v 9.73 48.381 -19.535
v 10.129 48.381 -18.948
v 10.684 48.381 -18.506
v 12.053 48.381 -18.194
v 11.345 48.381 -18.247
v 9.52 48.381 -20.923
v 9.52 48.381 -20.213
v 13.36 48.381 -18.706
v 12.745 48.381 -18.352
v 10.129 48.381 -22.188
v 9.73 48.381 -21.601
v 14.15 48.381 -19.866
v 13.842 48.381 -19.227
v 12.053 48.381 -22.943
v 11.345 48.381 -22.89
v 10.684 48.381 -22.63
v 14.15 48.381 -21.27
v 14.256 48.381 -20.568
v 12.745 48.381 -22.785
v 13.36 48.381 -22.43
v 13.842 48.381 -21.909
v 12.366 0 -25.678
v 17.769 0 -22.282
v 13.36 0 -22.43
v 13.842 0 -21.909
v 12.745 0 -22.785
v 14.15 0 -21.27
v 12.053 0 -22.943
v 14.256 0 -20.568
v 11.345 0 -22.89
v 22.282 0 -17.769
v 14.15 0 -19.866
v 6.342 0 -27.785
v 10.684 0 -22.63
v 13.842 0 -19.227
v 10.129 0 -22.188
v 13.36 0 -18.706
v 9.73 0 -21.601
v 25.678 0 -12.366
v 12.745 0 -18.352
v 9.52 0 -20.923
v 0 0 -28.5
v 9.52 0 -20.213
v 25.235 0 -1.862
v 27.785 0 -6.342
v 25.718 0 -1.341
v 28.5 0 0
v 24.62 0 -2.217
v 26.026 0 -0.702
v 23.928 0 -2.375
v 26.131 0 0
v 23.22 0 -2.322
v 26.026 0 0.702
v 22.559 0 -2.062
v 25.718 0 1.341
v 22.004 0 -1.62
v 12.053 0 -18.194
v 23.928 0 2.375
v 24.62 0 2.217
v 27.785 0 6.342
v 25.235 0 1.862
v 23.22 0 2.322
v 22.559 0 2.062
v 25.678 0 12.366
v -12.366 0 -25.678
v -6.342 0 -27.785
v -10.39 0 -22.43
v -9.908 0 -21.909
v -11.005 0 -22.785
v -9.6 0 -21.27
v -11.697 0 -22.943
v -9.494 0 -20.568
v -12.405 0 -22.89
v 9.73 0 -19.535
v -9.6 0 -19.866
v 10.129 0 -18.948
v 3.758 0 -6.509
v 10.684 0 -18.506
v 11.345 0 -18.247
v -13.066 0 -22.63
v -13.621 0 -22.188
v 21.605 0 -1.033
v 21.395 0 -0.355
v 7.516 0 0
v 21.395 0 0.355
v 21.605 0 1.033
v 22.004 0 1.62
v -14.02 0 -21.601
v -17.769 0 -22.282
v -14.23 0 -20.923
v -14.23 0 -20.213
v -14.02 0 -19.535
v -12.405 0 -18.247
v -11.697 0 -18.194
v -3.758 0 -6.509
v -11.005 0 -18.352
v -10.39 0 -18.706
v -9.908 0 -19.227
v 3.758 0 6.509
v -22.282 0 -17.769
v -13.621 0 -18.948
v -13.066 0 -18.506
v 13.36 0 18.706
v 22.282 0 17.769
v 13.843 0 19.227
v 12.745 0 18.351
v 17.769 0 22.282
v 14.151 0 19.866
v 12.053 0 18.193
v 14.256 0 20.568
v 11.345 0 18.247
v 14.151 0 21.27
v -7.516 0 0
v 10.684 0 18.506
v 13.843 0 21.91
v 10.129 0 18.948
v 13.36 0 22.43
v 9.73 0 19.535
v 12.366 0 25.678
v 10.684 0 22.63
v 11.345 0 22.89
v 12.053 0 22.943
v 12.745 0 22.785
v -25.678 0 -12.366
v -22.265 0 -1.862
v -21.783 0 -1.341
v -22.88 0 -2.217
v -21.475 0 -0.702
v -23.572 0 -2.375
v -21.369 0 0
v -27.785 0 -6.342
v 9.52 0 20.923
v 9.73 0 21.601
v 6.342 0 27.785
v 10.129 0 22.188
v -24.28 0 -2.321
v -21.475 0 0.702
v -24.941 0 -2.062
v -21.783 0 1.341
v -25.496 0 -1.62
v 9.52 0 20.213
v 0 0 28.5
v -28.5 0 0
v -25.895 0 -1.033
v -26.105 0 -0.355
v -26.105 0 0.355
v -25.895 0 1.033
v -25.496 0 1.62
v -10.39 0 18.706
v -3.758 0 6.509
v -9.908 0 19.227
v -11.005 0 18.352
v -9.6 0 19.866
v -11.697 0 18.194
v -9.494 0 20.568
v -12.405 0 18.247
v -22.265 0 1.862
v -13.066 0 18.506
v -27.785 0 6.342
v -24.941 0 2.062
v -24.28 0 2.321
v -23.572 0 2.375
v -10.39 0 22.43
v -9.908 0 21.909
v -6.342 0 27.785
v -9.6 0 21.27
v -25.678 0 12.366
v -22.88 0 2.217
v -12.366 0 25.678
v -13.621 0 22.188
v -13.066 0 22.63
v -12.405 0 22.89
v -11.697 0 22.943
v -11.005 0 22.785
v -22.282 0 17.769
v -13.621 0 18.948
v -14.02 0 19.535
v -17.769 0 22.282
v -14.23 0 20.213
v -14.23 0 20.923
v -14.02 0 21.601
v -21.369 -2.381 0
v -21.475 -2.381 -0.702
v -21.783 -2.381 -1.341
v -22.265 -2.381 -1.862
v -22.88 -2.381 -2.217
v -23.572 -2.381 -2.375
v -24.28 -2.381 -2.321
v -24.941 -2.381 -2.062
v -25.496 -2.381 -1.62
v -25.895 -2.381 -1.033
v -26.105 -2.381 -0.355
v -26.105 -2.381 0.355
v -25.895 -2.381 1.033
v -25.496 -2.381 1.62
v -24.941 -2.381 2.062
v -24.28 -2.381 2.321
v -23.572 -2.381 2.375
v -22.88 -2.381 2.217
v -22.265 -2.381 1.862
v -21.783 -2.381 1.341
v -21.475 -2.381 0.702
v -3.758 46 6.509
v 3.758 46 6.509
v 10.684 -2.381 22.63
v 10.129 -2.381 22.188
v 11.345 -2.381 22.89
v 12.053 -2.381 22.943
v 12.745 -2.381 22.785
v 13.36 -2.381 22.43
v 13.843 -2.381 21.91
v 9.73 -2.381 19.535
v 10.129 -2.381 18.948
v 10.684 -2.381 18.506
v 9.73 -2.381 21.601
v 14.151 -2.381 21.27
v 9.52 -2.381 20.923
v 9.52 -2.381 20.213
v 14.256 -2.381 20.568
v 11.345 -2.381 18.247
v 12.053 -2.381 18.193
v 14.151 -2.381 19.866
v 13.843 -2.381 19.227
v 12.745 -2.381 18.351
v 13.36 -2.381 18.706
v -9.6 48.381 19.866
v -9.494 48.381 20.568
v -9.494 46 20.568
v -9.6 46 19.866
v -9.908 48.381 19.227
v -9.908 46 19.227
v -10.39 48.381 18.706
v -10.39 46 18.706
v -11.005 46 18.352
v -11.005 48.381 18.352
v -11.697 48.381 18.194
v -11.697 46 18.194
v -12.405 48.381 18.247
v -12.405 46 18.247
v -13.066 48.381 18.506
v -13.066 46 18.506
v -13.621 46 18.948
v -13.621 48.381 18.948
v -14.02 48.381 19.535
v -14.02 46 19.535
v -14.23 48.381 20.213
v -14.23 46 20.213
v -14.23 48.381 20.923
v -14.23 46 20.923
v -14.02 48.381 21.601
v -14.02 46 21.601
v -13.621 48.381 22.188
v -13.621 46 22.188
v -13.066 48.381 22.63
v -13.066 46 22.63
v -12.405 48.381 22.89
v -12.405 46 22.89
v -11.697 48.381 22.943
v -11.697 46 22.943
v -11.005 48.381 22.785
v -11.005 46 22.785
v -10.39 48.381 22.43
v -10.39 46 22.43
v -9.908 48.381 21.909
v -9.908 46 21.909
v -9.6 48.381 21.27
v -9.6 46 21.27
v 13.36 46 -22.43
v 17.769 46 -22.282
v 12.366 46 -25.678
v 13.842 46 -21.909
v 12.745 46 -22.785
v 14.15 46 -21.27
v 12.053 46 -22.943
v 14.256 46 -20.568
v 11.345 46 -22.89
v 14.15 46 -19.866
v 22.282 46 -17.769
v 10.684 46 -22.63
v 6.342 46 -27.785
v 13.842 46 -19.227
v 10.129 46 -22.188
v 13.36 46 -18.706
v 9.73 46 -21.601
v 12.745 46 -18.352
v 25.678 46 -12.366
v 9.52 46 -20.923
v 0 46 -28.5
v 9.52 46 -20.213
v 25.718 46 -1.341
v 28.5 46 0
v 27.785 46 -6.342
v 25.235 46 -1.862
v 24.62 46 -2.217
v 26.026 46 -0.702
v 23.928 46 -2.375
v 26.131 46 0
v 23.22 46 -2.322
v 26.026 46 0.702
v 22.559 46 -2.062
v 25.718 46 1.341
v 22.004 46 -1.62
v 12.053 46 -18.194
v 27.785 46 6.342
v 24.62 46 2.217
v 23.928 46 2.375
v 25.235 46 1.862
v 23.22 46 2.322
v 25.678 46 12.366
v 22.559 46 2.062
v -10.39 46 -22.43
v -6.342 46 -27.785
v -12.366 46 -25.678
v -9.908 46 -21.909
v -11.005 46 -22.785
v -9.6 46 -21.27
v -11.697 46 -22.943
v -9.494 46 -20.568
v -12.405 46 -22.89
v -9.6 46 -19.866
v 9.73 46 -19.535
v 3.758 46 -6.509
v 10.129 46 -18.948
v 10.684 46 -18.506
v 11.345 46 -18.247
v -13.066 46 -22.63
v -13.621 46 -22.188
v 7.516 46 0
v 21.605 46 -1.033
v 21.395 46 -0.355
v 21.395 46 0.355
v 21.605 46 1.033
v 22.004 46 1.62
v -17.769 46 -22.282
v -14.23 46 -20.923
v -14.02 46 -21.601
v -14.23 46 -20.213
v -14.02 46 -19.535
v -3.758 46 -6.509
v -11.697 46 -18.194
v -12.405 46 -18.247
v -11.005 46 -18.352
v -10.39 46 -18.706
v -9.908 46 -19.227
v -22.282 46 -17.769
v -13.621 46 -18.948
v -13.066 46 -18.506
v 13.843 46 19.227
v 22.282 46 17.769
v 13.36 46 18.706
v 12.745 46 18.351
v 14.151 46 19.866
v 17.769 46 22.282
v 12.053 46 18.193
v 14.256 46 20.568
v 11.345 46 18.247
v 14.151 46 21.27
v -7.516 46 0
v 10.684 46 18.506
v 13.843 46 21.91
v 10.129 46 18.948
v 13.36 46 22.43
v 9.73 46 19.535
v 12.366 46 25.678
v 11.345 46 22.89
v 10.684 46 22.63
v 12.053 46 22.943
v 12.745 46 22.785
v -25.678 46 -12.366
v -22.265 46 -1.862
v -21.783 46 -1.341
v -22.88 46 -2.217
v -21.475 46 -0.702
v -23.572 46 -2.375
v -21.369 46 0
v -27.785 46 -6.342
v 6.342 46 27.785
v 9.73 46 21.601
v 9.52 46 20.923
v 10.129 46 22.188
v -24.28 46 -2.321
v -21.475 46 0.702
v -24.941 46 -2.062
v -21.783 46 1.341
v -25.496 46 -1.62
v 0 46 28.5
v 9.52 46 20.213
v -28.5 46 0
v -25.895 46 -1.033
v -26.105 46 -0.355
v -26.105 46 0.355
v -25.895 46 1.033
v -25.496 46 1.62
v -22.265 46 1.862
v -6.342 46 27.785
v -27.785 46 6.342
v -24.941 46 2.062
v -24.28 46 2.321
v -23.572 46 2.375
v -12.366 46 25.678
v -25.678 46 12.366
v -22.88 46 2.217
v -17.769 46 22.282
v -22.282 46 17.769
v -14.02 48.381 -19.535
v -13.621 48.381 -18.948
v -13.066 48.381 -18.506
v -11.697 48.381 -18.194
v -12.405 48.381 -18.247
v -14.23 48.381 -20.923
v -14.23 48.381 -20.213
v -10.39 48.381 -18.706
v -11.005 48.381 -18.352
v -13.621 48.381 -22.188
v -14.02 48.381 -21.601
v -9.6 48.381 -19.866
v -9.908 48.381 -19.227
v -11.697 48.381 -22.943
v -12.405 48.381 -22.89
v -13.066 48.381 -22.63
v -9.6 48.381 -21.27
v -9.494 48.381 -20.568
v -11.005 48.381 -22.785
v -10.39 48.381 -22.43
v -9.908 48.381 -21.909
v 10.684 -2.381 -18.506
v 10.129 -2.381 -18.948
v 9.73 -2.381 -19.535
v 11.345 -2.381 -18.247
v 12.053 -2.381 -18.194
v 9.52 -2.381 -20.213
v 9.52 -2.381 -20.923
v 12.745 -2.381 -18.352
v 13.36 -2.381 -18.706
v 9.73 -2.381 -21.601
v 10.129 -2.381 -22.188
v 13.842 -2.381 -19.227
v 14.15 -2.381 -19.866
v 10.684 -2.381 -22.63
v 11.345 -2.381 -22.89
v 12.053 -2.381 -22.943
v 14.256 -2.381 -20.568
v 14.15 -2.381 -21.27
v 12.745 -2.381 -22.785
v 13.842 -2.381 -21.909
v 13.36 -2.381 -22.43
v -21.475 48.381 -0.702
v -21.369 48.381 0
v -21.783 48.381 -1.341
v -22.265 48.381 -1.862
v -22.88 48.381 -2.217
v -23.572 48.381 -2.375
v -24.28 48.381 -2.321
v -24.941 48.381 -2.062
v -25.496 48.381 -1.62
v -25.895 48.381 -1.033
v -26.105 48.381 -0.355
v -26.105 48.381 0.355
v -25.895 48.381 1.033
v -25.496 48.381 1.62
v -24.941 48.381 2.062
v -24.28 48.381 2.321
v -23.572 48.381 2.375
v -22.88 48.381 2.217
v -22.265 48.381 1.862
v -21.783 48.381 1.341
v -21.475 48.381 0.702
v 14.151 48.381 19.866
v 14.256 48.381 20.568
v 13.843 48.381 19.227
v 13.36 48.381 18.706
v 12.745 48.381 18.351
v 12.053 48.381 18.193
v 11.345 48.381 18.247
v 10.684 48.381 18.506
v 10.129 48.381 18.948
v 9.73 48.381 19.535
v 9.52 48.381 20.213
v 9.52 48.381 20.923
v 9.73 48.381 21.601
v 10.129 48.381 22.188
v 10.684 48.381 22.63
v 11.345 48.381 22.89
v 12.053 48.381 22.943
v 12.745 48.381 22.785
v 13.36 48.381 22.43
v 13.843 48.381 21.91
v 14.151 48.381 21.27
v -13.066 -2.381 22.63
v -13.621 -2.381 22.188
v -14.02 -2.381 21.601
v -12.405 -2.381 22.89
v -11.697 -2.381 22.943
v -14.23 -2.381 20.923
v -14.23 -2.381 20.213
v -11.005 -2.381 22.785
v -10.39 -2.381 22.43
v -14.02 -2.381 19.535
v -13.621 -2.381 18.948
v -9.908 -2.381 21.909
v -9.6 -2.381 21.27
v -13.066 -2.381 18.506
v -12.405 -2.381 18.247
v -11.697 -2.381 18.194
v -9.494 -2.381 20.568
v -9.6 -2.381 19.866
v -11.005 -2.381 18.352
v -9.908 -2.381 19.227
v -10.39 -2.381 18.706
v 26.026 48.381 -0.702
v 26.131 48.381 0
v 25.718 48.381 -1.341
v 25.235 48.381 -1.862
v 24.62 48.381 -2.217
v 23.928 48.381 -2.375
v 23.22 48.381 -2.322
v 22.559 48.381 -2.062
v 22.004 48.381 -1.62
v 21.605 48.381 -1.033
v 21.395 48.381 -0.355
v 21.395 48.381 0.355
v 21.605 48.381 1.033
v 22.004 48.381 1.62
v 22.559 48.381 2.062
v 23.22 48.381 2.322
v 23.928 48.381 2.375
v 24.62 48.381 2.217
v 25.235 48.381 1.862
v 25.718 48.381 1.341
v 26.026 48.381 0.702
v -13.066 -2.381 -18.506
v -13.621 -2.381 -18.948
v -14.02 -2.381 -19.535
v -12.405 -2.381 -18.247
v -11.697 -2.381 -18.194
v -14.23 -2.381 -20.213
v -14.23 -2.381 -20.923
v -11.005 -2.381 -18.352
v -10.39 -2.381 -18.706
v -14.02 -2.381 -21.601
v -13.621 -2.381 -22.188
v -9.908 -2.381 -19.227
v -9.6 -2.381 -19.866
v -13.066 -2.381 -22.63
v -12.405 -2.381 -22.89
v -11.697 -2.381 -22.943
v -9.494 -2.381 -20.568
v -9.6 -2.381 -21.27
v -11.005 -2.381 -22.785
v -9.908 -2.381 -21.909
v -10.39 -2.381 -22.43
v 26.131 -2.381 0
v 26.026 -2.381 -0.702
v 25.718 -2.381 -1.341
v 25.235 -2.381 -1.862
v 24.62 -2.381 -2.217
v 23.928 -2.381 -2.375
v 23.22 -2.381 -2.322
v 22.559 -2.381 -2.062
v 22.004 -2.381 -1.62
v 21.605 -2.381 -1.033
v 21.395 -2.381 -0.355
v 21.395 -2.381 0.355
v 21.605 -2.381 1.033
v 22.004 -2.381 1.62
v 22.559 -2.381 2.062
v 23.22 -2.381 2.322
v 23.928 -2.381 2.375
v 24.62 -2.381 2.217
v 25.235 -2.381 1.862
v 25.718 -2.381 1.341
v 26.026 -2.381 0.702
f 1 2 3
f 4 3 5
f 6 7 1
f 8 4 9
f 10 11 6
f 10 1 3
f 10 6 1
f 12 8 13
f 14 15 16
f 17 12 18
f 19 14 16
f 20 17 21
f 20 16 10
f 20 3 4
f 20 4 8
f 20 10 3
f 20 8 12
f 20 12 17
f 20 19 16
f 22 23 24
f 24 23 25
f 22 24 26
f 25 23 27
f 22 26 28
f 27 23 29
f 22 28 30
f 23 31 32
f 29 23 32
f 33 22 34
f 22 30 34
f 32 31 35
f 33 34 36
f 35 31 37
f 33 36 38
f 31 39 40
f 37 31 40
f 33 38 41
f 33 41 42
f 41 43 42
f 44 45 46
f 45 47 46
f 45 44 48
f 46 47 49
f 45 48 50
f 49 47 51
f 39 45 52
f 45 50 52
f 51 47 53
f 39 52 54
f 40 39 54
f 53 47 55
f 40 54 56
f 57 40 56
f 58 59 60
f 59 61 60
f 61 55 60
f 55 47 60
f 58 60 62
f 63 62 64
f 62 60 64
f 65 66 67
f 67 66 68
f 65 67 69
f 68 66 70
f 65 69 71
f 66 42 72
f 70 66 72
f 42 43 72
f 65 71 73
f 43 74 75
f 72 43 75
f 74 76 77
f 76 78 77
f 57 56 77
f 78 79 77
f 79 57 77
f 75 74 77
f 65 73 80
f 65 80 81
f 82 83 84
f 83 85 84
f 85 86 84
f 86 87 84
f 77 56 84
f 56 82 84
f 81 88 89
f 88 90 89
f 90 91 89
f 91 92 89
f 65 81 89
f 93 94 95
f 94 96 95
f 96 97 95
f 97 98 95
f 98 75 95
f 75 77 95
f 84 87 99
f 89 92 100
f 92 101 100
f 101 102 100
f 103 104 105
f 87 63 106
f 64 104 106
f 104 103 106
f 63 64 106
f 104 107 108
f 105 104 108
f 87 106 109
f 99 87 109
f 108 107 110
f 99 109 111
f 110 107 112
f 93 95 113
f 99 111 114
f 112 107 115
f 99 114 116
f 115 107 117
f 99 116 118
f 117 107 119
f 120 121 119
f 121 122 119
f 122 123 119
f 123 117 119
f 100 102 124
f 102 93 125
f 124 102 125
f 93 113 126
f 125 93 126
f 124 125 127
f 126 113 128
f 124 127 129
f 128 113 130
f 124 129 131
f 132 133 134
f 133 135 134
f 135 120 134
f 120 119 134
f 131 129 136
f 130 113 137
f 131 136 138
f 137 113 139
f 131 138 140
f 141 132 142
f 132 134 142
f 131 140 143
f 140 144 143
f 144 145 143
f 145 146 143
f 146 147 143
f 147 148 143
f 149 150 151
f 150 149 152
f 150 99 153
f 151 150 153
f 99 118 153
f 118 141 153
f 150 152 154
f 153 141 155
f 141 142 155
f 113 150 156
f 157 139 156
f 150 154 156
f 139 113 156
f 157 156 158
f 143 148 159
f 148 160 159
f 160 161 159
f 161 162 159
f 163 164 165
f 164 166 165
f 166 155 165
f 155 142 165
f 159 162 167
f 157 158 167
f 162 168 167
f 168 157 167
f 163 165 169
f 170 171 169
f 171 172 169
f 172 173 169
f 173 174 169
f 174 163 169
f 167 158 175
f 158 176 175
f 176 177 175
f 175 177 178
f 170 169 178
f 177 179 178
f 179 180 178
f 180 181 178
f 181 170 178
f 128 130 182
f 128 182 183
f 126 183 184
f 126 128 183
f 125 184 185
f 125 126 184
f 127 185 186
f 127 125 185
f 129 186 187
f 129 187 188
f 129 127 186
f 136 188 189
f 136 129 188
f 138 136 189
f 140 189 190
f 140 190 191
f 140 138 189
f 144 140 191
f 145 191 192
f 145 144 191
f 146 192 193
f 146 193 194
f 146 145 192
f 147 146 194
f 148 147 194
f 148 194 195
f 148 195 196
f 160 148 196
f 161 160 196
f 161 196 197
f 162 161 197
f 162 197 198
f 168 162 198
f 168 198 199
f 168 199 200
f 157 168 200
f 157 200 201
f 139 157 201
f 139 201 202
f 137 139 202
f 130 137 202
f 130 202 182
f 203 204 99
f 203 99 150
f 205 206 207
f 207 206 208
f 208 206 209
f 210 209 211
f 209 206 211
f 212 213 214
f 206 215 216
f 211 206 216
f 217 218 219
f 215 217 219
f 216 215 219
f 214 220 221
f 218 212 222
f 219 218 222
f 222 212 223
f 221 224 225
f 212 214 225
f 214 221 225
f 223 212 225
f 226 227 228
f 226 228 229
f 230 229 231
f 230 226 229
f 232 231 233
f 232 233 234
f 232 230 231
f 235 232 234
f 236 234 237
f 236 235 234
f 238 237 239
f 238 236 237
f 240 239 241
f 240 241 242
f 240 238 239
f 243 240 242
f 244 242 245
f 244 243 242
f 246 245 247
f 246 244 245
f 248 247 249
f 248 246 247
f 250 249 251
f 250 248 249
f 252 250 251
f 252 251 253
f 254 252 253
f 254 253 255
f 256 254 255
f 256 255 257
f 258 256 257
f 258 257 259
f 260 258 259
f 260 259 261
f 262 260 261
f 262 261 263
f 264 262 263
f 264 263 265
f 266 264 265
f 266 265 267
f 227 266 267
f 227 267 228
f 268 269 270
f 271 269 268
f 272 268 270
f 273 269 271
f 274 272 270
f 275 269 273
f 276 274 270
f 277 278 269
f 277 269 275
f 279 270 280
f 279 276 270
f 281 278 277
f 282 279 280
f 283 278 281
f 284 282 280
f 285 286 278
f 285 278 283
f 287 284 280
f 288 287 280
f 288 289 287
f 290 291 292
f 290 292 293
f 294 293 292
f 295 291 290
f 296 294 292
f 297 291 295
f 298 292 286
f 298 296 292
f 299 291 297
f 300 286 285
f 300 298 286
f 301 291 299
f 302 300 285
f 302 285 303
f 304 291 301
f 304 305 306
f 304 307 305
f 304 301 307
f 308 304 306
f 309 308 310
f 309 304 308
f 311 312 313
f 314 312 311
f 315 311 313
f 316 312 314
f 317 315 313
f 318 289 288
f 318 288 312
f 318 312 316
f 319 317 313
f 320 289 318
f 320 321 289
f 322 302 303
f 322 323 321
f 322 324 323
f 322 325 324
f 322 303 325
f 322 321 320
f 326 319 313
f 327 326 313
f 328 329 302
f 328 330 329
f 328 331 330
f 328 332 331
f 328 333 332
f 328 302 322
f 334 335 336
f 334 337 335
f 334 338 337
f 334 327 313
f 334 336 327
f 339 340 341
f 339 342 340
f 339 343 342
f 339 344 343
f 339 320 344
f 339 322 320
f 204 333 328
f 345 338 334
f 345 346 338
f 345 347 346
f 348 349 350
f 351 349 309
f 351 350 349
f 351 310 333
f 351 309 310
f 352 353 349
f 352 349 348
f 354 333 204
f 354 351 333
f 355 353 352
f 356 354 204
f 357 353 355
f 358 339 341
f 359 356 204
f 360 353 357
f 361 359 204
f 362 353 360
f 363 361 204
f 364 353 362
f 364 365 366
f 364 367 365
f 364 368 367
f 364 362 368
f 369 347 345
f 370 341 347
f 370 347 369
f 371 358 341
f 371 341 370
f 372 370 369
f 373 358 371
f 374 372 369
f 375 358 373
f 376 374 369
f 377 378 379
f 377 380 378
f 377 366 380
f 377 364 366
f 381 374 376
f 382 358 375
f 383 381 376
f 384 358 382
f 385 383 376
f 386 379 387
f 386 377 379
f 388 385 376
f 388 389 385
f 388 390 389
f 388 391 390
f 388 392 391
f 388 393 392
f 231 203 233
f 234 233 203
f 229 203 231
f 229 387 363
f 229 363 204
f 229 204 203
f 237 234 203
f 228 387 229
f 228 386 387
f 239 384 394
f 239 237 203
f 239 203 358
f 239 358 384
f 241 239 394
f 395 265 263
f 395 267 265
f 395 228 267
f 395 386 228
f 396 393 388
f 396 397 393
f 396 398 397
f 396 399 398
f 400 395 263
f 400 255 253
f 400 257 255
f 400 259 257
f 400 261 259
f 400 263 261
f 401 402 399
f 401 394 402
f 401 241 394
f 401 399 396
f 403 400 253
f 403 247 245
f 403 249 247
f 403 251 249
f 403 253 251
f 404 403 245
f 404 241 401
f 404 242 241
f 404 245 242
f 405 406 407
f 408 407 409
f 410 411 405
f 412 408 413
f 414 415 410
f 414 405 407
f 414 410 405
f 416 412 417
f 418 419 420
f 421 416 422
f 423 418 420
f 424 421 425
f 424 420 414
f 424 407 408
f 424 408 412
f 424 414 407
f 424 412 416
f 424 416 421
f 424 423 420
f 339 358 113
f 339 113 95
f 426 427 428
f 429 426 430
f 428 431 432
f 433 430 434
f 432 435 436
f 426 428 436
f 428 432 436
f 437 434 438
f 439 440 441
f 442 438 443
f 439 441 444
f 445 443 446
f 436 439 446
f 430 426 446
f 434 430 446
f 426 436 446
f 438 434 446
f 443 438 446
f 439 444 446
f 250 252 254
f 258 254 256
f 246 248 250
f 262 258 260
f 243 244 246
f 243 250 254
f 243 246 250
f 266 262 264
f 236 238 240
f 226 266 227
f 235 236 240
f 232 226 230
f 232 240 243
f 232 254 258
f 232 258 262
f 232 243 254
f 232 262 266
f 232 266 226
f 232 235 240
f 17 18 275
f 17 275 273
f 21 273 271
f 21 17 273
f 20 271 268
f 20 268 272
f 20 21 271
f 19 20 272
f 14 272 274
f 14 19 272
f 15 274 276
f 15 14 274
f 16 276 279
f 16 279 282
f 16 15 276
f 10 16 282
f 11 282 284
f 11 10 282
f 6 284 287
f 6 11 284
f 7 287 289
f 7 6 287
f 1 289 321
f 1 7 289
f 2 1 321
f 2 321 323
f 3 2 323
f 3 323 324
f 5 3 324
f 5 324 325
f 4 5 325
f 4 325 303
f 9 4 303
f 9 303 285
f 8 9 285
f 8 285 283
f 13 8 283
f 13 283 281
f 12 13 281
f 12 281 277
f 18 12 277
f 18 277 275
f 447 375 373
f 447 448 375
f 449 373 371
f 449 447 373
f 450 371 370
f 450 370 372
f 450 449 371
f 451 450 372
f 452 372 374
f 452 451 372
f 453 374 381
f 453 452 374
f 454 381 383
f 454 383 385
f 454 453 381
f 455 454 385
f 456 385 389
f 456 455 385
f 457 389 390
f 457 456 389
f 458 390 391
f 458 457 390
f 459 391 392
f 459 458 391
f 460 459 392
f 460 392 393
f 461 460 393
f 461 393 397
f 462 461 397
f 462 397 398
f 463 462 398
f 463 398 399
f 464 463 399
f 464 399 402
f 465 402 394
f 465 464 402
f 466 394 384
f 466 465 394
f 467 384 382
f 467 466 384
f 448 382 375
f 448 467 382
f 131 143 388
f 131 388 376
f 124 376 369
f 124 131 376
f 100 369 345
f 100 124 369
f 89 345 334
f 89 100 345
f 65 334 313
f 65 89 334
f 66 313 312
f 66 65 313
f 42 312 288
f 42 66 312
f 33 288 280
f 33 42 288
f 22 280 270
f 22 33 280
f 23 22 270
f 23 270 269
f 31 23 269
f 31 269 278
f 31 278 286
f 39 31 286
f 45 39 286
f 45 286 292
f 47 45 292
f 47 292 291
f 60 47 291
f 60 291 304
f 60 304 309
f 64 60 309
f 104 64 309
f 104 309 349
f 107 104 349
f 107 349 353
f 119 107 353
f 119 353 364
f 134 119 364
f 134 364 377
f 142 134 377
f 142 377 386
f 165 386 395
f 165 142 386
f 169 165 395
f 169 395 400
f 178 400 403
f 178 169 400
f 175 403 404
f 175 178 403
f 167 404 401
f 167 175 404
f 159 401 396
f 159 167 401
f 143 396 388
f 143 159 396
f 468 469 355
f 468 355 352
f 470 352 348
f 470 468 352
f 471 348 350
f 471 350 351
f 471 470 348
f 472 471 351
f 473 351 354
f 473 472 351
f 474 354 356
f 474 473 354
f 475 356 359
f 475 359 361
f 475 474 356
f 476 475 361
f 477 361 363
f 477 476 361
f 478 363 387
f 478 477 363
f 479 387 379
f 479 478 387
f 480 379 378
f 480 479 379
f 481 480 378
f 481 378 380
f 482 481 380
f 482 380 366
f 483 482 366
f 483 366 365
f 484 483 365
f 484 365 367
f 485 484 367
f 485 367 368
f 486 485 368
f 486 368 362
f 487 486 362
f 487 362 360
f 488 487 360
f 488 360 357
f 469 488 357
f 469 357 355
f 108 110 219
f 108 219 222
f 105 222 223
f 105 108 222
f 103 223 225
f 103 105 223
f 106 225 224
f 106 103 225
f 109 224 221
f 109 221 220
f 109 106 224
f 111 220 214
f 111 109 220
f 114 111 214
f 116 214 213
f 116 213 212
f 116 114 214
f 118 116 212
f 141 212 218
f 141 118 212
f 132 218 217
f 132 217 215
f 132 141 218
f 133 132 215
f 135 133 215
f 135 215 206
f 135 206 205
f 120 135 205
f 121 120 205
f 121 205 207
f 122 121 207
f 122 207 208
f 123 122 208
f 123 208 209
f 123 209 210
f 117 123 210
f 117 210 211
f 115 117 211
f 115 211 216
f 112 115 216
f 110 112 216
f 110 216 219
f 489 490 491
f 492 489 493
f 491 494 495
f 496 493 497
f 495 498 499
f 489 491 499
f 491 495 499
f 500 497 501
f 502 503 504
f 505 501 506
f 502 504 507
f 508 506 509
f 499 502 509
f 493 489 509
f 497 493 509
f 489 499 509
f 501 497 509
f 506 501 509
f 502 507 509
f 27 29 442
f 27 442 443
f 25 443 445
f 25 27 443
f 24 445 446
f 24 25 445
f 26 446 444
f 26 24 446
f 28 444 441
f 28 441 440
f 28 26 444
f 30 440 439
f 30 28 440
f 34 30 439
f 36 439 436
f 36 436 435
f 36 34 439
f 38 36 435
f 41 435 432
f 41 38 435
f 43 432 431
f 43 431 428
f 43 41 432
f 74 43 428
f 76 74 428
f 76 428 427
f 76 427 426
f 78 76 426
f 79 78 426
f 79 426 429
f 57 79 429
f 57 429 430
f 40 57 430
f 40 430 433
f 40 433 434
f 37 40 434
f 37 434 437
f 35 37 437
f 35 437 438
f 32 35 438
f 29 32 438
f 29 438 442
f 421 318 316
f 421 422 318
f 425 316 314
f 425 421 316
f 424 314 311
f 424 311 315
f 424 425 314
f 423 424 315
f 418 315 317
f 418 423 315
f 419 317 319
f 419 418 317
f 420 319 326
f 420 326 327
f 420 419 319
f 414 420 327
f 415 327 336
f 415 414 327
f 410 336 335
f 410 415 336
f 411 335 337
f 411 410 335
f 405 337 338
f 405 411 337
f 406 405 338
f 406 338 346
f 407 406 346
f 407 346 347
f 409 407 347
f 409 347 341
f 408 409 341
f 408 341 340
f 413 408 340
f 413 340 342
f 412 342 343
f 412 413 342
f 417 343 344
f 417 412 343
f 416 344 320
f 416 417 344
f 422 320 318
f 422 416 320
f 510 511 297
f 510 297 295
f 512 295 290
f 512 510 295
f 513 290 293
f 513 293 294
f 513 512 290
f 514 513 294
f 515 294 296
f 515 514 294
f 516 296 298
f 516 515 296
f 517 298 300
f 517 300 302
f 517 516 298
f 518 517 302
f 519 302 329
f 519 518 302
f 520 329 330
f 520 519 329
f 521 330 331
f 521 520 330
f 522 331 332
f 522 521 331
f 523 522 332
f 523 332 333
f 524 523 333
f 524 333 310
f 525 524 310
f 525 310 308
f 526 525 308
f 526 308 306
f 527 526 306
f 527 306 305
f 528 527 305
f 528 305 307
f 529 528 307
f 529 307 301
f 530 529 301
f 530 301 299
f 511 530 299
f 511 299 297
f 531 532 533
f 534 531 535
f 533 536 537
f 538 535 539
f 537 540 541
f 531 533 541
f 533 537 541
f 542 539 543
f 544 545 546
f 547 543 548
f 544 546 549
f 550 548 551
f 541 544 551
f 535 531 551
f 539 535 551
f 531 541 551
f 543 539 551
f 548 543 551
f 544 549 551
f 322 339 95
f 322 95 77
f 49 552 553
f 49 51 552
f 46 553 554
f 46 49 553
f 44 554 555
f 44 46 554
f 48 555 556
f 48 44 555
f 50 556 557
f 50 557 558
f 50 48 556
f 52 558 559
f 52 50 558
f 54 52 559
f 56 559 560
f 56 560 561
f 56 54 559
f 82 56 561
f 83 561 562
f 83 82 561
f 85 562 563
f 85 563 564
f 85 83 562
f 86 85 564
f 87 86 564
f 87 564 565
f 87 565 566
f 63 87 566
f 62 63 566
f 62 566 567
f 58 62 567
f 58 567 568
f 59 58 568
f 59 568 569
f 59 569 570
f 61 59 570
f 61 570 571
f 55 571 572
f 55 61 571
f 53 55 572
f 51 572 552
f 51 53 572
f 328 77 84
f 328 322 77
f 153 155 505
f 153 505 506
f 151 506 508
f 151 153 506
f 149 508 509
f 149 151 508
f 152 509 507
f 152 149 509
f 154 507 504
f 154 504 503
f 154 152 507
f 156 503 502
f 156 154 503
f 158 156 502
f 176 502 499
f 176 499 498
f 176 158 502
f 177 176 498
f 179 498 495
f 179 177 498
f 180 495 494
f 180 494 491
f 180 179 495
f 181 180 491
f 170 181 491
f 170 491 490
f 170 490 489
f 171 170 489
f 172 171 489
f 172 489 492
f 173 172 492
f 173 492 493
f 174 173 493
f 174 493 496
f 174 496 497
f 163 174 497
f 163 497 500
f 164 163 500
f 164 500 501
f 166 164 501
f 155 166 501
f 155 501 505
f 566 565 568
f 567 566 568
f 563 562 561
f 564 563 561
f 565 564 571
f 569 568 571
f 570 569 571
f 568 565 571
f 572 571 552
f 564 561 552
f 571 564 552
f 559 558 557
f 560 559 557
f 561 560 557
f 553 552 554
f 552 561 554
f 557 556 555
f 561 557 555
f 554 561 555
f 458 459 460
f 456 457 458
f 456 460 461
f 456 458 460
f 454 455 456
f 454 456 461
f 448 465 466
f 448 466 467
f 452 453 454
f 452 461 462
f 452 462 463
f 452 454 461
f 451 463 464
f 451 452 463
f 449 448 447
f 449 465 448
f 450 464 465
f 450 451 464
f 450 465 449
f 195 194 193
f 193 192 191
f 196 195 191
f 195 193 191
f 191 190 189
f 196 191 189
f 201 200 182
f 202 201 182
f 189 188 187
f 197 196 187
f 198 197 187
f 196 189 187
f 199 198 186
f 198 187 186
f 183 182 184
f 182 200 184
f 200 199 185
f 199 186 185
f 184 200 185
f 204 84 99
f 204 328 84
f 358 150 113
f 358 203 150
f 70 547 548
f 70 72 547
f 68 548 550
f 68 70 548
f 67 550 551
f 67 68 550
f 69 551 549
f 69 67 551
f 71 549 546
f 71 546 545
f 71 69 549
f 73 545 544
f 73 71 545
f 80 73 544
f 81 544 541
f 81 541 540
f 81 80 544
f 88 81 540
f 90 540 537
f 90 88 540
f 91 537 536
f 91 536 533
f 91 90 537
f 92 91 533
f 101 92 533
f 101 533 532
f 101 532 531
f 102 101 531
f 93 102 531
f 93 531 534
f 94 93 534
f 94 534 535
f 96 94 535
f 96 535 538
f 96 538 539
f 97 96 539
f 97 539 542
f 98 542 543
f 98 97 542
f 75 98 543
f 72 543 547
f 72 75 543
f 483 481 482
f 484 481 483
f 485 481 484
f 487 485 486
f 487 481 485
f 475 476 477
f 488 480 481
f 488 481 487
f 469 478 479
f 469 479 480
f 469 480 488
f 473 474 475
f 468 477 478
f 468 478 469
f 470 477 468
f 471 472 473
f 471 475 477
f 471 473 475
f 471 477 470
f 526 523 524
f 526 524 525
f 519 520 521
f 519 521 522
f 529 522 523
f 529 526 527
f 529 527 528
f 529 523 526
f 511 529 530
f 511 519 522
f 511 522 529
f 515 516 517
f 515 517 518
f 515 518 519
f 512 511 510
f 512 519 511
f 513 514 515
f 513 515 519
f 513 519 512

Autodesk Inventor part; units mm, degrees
ref_plane "YZ Plane" through (0, 0, 0) normal (1, 0, 0) x (0, 1, 0)
ref_plane "XZ Plane" through (0, 0, 0) normal (0, 1, 0) x (-1, 0, 0)
ref_plane "XY Plane" through (0, 0, 0) normal (0, 0, 1) x (1, 0, 0)
sketch "Sketch1" plane through (0, 0, 0) normal (0, 1, 0) x (-1, 0, 0)
  circle A0 centre (0, 0) radius 28.5
  circle A1 centre (0, 0) radius 9
  circle A2 centre (11.875, 20.5681) radius 1.5875
  circle A3 centre (-11.875, 20.5681) radius 1.5875
  circle A4 centre (23.75, 0) radius 1.5875
  circle A5 centre (11.875, -20.5681) radius 1.5875
  circle A6 centre (-11.875, -20.5681) radius 1.5875
  circle A7 centre (-23.75, 0) radius 1.5875
  dimension "d5" = 3.175
  dimension "d6" = 20.5681
  dimension "d7" = 3.175
  dimension "d8" = 3.175
  dimension "d9" = 3.175
  dimension "d10" = 3.175
  dimension "d11" = 3.175
extrude "Extrusion1" add sketch "Sketch1" along normal blind 46
sketch "Sketch2" plane through (0, 46, 0) normal (0, 1, 0) x (1, 0, 0)
  line L0 (7.5157, 0) -> (3.7578, -6.5088)
  line L1 (3.7578, -6.5088) -> (-3.7578, -6.5088)
  line L2 (-3.7578, -6.5088) -> (-7.5157, 0)
  line L3 (-7.5157, 0) -> (-3.7578, 6.5088)
  line L4 (-3.7578, 6.5088) -> (3.7578, 6.5088)
  line L5 (3.7578, 6.5088) -> (7.5157, 0)
  circle A0 centre (0, 0) radius 28.5 projected
  circle A1 centre (-11.875, -20.5681) radius 1.5875 projected
  circle A2 centre (11.875, -20.5681) radius 1.5875 projected
  circle A3 centre (-23.75, 0) radius 1.5875 projected
  circle A4 centre (-11.875, 20.5681) radius 1.5875 projected
  circle A5 centre (23.75, 0) radius 1.5875 projected
  circle A6 centre (11.875, 20.5681) radius 1.5875 projected
  dimension "d4" = 13.0175
extrude "Extrusion2" add sketch "Sketch2" against normal blind 46
sketch "Sketch3" plane through (0, 46, 0) normal (0, 1, 0) x (1, 0, 0)
  circle A0 centre (-11.875, 20.5681) radius 1.5875 projected
  circle A1 centre (-11.875, 20.5681) radius 2.3812
  circle A2 centre (11.875, 20.5681) radius 1.5875 projected
  circle A3 centre (11.875, 20.5681) radius 2.3812
  circle A4 centre (23.75, 0) radius 1.5875 projected
  circle A5 centre (23.75, 0) radius 2.3813
  circle A6 centre (11.875, -20.5681) radius 1.5875 projected
  circle A7 centre (11.875, -20.5681) radius 2.3813
  circle A8 centre (-11.875, -20.5681) radius 1.5875 projected
  circle A9 centre (-11.875, -20.5681) radius 2.3812
  circle A10 centre (-23.75, 0) radius 1.5875 projected
  circle A11 centre (-23.75, 0) radius 2.3812
  point P0 (0, 0)
  dimension "d12" = 4.7625
  dimension "d13" = 4.7625
  dimension "d14" = 4.7625
  dimension "d15" = 4.7625
  dimension "d16" = 4.7625
  dimension "d17" = 4.7625
extrude "Extrusion3" add sketch "Sketch3" along normal blind 2.3813 and the other way blind 48.3807 contours A0 | A1 | A2 | A3 | A4 | A5 | A6 | A7 | A8 | A9 | A10 | A11
equation "\"d7\" = d5"
equation "\"d8\" = d5"
equation "\"d9\" = d5"
equation "\"d10\" = d5"
equation "\"d11\" = d5"
properties part number "new mech inside"
